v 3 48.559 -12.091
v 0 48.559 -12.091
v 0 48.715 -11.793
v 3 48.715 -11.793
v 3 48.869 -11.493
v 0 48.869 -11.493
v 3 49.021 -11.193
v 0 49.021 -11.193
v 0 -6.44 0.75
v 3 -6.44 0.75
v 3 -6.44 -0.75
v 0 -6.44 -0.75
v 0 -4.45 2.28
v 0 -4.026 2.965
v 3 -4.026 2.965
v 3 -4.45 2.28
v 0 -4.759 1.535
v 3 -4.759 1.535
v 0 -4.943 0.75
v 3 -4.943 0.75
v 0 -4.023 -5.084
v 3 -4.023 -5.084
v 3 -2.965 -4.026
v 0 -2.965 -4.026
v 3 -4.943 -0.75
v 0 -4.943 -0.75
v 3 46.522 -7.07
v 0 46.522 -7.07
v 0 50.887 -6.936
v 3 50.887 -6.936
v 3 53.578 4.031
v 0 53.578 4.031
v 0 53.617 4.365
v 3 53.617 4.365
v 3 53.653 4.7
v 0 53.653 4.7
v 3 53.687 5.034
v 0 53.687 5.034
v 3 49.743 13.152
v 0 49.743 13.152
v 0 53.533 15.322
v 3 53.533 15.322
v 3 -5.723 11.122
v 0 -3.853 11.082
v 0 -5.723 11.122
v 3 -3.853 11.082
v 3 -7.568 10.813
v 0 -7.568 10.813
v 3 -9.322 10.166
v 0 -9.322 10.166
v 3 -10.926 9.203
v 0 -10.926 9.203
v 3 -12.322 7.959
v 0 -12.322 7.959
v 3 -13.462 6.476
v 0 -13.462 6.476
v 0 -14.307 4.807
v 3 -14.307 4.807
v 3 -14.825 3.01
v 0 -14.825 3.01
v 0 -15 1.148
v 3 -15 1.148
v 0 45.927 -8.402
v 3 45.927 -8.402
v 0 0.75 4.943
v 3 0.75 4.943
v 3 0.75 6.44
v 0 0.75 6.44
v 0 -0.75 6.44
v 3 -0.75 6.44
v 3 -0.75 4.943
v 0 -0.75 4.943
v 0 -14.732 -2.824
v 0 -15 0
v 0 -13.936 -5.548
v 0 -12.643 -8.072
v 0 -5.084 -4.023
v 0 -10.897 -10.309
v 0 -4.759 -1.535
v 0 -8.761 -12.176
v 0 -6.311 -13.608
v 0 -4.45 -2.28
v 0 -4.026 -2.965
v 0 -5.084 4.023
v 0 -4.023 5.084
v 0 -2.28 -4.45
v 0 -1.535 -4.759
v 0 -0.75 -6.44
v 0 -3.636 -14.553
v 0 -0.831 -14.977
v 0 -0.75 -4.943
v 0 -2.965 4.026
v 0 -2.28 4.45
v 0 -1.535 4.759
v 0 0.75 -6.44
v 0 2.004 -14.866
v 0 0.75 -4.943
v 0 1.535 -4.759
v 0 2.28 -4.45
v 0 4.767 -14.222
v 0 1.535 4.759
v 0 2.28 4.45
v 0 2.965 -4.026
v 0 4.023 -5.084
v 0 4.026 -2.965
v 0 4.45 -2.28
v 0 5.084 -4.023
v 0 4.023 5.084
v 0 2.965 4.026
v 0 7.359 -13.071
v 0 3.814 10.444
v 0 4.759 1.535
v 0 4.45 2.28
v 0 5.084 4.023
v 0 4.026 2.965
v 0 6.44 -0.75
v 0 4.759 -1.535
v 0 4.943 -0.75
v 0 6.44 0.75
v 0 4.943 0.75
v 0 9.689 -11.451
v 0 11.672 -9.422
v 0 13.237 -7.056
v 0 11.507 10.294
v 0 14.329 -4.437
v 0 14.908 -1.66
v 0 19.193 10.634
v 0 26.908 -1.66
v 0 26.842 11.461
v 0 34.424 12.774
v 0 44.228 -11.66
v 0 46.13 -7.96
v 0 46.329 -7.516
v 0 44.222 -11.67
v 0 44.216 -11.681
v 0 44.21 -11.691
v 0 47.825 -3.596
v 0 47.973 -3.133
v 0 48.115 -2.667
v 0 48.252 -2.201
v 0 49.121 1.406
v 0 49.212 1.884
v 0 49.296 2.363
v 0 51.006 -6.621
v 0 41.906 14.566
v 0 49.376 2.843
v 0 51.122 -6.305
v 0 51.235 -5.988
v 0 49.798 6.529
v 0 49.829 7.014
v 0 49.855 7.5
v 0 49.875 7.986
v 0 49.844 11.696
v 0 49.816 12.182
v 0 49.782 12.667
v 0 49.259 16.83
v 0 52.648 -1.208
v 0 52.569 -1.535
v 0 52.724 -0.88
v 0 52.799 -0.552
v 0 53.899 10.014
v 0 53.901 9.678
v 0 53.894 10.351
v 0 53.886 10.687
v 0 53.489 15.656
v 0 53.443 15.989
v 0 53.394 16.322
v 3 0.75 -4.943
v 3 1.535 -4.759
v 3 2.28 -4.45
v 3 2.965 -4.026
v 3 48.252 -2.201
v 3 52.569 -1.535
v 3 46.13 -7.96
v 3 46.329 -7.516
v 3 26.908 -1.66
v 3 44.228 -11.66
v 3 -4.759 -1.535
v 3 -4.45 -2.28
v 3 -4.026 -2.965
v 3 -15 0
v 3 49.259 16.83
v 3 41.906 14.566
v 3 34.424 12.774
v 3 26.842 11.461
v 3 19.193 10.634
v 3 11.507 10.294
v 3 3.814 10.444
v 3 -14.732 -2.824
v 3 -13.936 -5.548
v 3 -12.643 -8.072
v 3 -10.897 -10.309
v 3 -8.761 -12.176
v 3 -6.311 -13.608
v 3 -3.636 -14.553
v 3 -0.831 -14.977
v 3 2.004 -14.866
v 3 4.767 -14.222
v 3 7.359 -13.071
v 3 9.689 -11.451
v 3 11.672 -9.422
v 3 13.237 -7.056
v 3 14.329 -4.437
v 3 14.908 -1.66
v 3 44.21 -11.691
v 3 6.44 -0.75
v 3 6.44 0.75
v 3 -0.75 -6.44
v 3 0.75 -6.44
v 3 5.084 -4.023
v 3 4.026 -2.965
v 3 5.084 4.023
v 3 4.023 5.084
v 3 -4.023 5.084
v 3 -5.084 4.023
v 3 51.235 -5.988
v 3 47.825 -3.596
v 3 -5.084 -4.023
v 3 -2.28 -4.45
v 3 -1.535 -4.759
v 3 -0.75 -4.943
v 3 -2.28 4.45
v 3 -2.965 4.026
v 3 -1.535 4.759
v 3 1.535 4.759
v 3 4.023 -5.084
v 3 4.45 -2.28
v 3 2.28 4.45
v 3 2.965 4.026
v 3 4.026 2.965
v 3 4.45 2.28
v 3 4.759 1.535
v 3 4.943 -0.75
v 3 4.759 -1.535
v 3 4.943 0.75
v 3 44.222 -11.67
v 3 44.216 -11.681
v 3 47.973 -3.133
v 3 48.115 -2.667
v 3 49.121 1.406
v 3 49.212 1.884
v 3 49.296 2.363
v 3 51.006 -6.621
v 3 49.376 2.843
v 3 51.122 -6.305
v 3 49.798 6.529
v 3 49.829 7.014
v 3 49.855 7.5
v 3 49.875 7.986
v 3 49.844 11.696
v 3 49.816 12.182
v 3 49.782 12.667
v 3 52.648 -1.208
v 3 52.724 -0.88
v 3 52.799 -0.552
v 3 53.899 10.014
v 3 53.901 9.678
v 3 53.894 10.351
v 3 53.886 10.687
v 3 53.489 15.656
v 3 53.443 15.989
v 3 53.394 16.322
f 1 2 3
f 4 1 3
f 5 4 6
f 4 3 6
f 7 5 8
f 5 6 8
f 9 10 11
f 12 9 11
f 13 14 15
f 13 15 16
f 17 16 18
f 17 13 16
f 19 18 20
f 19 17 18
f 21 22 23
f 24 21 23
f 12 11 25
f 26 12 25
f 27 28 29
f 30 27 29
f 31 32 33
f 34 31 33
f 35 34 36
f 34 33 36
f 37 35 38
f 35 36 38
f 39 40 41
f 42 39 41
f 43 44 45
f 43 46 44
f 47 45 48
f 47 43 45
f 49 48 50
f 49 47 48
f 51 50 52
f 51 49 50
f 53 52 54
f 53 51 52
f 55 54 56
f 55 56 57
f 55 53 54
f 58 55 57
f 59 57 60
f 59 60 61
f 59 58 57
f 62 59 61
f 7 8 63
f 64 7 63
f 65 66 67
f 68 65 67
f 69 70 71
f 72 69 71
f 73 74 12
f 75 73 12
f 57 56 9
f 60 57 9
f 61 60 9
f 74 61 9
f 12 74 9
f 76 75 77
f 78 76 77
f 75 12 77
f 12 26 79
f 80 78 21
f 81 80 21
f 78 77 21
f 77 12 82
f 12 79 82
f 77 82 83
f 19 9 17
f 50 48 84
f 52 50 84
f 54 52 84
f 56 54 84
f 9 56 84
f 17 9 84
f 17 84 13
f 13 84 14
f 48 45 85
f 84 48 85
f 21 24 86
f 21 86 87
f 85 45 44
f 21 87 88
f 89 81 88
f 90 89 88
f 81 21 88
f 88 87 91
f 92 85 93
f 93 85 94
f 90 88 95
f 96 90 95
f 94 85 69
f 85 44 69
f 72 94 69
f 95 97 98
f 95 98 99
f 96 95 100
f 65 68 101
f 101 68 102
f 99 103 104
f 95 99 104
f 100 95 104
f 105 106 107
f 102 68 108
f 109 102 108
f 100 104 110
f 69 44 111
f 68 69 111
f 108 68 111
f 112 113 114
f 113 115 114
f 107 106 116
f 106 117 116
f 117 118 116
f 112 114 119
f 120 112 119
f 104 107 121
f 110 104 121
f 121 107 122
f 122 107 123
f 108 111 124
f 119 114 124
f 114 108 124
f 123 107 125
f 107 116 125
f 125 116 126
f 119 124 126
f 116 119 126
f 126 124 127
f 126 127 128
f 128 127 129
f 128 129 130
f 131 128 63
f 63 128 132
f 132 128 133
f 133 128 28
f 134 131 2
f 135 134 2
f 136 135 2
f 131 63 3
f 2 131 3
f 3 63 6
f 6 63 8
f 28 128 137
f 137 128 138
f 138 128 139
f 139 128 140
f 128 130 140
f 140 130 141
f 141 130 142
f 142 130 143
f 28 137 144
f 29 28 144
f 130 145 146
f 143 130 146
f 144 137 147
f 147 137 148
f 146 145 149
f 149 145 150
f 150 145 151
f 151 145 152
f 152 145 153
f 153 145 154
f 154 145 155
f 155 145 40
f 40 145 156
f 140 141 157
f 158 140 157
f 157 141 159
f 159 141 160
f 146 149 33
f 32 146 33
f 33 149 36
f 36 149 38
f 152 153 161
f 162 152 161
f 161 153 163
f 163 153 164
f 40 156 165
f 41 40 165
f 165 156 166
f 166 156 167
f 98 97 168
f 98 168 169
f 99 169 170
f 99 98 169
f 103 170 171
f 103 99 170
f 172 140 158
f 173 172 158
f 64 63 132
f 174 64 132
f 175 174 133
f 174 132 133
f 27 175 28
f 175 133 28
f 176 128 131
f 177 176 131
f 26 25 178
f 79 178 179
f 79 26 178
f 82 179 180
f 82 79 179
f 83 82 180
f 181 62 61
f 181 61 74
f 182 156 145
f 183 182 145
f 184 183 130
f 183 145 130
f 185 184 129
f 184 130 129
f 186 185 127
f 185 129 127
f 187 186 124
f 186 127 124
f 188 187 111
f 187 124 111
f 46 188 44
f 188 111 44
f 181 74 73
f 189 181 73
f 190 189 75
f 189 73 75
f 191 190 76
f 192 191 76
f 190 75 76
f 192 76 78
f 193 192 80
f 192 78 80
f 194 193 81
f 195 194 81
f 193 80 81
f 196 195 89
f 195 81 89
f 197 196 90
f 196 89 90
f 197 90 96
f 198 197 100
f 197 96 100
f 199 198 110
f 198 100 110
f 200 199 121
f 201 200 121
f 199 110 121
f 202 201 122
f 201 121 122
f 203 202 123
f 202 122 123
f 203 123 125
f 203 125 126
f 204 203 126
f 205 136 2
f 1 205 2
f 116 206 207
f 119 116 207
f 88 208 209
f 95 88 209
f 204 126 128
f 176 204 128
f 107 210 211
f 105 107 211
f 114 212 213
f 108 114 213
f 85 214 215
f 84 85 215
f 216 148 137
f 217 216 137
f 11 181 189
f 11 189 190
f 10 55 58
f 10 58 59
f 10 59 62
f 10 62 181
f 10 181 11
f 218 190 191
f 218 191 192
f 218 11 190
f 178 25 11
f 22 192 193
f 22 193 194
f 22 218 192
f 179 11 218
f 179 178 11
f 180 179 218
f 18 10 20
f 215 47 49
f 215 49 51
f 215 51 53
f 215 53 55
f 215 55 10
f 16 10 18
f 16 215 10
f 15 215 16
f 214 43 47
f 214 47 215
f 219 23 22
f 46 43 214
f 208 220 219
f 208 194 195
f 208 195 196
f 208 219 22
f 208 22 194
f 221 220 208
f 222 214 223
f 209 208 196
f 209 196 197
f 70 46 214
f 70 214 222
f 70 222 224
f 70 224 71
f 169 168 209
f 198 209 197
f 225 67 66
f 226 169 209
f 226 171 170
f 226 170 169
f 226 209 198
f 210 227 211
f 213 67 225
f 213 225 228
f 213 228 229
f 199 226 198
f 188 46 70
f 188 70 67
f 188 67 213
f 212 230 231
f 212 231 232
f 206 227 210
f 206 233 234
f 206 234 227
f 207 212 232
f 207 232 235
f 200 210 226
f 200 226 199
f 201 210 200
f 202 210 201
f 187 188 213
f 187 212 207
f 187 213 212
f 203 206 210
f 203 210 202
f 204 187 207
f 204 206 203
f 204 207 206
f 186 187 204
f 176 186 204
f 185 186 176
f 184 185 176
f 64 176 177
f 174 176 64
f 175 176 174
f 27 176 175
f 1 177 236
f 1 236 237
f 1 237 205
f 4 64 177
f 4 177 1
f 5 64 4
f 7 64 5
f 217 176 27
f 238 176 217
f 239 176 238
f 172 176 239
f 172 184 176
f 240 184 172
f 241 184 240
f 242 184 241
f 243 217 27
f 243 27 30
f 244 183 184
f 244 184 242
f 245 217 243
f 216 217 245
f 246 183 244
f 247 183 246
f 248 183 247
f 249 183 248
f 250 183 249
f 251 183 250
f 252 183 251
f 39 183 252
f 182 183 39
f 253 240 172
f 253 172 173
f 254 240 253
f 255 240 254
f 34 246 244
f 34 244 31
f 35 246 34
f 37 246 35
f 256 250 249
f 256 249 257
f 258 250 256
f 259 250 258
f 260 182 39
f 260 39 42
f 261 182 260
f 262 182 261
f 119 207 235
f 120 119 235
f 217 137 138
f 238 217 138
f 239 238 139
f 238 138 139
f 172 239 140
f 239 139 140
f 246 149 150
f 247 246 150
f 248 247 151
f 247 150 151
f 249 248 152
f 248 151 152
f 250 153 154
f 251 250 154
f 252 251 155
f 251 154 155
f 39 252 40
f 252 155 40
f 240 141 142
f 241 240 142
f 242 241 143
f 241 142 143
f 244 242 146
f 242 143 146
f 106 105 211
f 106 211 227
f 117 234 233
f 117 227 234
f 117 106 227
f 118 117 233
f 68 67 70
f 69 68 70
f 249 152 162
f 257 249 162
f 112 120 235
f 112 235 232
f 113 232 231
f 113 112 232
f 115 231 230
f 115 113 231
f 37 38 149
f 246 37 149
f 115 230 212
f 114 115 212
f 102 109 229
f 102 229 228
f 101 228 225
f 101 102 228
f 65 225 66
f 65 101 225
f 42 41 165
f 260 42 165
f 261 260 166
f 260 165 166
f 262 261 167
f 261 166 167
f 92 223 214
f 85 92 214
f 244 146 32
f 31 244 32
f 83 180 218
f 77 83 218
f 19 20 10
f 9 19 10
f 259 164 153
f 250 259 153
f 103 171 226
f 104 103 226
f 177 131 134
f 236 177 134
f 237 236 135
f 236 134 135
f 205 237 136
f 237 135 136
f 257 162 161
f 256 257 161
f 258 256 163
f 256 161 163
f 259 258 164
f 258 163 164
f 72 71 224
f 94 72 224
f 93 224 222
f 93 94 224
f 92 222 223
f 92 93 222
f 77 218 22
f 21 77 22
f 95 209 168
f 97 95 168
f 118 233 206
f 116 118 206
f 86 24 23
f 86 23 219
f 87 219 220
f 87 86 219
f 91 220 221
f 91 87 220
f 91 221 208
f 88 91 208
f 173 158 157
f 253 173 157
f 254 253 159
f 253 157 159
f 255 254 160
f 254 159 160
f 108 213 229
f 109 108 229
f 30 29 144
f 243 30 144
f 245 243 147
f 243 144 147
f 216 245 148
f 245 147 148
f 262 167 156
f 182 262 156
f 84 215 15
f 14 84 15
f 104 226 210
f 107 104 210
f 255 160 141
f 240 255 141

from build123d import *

# Parameters (mm, degrees)
SKETCH1_R           = 5
BOSS_EXTRUDE1_DEPTH = 3
CUT_EXTRUDE1_DEPTH  = 53.748723346
CIRPATTERN1_COUNT   = 8
BOSS_EXTRUDE2_DEPTH = 3
CIRPATTERN2_COUNT   = 6
CIRPATTERN2_ANGLE   = 35.051
FILLET1_R           = 10


with BuildPart() as part:
    # Sketch1 → Boss-Extrude1 (new body)
    with BuildSketch(Plane.YZ):
        with BuildLine():
            ThreePointArc((-15, 0), (-0.831277496, -14.976948211), (14.907863697, -1.66))
            Line((14.907863697, -1.66), (26.907863697, -1.66))
            Line((26.907863697, -1.66), (44.228371772, -11.66))
            ThreePointArc((44.228371772, -11.66), (49.257804904, 2.141068881), (49.25938105, 16.83))
            ThreePointArc((49.25938105, 16.83), (17.396021386, 10.510227399), (-15, 12.9))
            Line((-15, 12.9), (-15, 0))
        make_face()
        Circle(SKETCH1_R, mode=Mode.SUBTRACT)
    extrude(amount=BOSS_EXTRUDE1_DEPTH)

    # Sketch1<3> → Cut-Extrude1 (cut, symmetric)
    with BuildSketch(Plane.YZ):
        with BuildLine():
            Line((0.75, 6.44), (-0.75, 6.44))
            Line((-0.75, 6.44), (-0.75, 4.943429983))
            ThreePointArc((-0.75, 4.943429983), (0, 5), (0.75, 4.943429983))
            Line((0.75, 4.943429983), (0.75, 6.44))
        make_face()
    cut_extrude1 = extrude(amount=CUT_EXTRUDE1_DEPTH, both=True, mode=Mode.SUBTRACT)

    # CirPattern1: Cut-Extrude1 ×8 about axis
    cirpattern1_axis = Axis((3, 0, 0), (1, 0, 0))
    for i in range(1, CIRPATTERN1_COUNT):
        add(cut_extrude1.rotate(cirpattern1_axis, i * 360 / CIRPATTERN1_COUNT), mode=Mode.SUBTRACT)

    # Sketch1<4> → Boss-Extrude2 (add)
    with BuildSketch(Plane.YZ):
        with BuildLine():
            ThreePointArc((49.25938105, 16.83), (49.541442906, 14.996225218), (49.74274412, 13.151837335))
            Line((49.74274412, 13.151837335), (53.53256333, 15.322287261))
            ThreePointArc((53.53256333, 15.322287261), (53.466194285, 15.822664237), (53.394369482, 16.322287261))
            Line((53.394369482, 16.322287261), (49.25938105, 16.83))
        make_face()
    boss_extrude2 = extrude(amount=BOSS_EXTRUDE2_DEPTH)

    # CirPattern2: Boss-Extrude2 ×6 about axis
    cirpattern2_axis = Axis((3, 7.641692502, 9.49), (-1, 0, 0))
    for i in range(1, CIRPATTERN2_COUNT):
        add(boss_extrude2.rotate(cirpattern2_axis, i * CIRPATTERN2_ANGLE / (CIRPATTERN2_COUNT - 1)))

    # Fillet1
    fillet1_edges = [part.edges().sort_by_distance(p)[0] for p in [
        (1.5, -15, 12.9),
    ]]
    fillet(fillet1_edges, radius=FILLET1_R)


solid = part.part
